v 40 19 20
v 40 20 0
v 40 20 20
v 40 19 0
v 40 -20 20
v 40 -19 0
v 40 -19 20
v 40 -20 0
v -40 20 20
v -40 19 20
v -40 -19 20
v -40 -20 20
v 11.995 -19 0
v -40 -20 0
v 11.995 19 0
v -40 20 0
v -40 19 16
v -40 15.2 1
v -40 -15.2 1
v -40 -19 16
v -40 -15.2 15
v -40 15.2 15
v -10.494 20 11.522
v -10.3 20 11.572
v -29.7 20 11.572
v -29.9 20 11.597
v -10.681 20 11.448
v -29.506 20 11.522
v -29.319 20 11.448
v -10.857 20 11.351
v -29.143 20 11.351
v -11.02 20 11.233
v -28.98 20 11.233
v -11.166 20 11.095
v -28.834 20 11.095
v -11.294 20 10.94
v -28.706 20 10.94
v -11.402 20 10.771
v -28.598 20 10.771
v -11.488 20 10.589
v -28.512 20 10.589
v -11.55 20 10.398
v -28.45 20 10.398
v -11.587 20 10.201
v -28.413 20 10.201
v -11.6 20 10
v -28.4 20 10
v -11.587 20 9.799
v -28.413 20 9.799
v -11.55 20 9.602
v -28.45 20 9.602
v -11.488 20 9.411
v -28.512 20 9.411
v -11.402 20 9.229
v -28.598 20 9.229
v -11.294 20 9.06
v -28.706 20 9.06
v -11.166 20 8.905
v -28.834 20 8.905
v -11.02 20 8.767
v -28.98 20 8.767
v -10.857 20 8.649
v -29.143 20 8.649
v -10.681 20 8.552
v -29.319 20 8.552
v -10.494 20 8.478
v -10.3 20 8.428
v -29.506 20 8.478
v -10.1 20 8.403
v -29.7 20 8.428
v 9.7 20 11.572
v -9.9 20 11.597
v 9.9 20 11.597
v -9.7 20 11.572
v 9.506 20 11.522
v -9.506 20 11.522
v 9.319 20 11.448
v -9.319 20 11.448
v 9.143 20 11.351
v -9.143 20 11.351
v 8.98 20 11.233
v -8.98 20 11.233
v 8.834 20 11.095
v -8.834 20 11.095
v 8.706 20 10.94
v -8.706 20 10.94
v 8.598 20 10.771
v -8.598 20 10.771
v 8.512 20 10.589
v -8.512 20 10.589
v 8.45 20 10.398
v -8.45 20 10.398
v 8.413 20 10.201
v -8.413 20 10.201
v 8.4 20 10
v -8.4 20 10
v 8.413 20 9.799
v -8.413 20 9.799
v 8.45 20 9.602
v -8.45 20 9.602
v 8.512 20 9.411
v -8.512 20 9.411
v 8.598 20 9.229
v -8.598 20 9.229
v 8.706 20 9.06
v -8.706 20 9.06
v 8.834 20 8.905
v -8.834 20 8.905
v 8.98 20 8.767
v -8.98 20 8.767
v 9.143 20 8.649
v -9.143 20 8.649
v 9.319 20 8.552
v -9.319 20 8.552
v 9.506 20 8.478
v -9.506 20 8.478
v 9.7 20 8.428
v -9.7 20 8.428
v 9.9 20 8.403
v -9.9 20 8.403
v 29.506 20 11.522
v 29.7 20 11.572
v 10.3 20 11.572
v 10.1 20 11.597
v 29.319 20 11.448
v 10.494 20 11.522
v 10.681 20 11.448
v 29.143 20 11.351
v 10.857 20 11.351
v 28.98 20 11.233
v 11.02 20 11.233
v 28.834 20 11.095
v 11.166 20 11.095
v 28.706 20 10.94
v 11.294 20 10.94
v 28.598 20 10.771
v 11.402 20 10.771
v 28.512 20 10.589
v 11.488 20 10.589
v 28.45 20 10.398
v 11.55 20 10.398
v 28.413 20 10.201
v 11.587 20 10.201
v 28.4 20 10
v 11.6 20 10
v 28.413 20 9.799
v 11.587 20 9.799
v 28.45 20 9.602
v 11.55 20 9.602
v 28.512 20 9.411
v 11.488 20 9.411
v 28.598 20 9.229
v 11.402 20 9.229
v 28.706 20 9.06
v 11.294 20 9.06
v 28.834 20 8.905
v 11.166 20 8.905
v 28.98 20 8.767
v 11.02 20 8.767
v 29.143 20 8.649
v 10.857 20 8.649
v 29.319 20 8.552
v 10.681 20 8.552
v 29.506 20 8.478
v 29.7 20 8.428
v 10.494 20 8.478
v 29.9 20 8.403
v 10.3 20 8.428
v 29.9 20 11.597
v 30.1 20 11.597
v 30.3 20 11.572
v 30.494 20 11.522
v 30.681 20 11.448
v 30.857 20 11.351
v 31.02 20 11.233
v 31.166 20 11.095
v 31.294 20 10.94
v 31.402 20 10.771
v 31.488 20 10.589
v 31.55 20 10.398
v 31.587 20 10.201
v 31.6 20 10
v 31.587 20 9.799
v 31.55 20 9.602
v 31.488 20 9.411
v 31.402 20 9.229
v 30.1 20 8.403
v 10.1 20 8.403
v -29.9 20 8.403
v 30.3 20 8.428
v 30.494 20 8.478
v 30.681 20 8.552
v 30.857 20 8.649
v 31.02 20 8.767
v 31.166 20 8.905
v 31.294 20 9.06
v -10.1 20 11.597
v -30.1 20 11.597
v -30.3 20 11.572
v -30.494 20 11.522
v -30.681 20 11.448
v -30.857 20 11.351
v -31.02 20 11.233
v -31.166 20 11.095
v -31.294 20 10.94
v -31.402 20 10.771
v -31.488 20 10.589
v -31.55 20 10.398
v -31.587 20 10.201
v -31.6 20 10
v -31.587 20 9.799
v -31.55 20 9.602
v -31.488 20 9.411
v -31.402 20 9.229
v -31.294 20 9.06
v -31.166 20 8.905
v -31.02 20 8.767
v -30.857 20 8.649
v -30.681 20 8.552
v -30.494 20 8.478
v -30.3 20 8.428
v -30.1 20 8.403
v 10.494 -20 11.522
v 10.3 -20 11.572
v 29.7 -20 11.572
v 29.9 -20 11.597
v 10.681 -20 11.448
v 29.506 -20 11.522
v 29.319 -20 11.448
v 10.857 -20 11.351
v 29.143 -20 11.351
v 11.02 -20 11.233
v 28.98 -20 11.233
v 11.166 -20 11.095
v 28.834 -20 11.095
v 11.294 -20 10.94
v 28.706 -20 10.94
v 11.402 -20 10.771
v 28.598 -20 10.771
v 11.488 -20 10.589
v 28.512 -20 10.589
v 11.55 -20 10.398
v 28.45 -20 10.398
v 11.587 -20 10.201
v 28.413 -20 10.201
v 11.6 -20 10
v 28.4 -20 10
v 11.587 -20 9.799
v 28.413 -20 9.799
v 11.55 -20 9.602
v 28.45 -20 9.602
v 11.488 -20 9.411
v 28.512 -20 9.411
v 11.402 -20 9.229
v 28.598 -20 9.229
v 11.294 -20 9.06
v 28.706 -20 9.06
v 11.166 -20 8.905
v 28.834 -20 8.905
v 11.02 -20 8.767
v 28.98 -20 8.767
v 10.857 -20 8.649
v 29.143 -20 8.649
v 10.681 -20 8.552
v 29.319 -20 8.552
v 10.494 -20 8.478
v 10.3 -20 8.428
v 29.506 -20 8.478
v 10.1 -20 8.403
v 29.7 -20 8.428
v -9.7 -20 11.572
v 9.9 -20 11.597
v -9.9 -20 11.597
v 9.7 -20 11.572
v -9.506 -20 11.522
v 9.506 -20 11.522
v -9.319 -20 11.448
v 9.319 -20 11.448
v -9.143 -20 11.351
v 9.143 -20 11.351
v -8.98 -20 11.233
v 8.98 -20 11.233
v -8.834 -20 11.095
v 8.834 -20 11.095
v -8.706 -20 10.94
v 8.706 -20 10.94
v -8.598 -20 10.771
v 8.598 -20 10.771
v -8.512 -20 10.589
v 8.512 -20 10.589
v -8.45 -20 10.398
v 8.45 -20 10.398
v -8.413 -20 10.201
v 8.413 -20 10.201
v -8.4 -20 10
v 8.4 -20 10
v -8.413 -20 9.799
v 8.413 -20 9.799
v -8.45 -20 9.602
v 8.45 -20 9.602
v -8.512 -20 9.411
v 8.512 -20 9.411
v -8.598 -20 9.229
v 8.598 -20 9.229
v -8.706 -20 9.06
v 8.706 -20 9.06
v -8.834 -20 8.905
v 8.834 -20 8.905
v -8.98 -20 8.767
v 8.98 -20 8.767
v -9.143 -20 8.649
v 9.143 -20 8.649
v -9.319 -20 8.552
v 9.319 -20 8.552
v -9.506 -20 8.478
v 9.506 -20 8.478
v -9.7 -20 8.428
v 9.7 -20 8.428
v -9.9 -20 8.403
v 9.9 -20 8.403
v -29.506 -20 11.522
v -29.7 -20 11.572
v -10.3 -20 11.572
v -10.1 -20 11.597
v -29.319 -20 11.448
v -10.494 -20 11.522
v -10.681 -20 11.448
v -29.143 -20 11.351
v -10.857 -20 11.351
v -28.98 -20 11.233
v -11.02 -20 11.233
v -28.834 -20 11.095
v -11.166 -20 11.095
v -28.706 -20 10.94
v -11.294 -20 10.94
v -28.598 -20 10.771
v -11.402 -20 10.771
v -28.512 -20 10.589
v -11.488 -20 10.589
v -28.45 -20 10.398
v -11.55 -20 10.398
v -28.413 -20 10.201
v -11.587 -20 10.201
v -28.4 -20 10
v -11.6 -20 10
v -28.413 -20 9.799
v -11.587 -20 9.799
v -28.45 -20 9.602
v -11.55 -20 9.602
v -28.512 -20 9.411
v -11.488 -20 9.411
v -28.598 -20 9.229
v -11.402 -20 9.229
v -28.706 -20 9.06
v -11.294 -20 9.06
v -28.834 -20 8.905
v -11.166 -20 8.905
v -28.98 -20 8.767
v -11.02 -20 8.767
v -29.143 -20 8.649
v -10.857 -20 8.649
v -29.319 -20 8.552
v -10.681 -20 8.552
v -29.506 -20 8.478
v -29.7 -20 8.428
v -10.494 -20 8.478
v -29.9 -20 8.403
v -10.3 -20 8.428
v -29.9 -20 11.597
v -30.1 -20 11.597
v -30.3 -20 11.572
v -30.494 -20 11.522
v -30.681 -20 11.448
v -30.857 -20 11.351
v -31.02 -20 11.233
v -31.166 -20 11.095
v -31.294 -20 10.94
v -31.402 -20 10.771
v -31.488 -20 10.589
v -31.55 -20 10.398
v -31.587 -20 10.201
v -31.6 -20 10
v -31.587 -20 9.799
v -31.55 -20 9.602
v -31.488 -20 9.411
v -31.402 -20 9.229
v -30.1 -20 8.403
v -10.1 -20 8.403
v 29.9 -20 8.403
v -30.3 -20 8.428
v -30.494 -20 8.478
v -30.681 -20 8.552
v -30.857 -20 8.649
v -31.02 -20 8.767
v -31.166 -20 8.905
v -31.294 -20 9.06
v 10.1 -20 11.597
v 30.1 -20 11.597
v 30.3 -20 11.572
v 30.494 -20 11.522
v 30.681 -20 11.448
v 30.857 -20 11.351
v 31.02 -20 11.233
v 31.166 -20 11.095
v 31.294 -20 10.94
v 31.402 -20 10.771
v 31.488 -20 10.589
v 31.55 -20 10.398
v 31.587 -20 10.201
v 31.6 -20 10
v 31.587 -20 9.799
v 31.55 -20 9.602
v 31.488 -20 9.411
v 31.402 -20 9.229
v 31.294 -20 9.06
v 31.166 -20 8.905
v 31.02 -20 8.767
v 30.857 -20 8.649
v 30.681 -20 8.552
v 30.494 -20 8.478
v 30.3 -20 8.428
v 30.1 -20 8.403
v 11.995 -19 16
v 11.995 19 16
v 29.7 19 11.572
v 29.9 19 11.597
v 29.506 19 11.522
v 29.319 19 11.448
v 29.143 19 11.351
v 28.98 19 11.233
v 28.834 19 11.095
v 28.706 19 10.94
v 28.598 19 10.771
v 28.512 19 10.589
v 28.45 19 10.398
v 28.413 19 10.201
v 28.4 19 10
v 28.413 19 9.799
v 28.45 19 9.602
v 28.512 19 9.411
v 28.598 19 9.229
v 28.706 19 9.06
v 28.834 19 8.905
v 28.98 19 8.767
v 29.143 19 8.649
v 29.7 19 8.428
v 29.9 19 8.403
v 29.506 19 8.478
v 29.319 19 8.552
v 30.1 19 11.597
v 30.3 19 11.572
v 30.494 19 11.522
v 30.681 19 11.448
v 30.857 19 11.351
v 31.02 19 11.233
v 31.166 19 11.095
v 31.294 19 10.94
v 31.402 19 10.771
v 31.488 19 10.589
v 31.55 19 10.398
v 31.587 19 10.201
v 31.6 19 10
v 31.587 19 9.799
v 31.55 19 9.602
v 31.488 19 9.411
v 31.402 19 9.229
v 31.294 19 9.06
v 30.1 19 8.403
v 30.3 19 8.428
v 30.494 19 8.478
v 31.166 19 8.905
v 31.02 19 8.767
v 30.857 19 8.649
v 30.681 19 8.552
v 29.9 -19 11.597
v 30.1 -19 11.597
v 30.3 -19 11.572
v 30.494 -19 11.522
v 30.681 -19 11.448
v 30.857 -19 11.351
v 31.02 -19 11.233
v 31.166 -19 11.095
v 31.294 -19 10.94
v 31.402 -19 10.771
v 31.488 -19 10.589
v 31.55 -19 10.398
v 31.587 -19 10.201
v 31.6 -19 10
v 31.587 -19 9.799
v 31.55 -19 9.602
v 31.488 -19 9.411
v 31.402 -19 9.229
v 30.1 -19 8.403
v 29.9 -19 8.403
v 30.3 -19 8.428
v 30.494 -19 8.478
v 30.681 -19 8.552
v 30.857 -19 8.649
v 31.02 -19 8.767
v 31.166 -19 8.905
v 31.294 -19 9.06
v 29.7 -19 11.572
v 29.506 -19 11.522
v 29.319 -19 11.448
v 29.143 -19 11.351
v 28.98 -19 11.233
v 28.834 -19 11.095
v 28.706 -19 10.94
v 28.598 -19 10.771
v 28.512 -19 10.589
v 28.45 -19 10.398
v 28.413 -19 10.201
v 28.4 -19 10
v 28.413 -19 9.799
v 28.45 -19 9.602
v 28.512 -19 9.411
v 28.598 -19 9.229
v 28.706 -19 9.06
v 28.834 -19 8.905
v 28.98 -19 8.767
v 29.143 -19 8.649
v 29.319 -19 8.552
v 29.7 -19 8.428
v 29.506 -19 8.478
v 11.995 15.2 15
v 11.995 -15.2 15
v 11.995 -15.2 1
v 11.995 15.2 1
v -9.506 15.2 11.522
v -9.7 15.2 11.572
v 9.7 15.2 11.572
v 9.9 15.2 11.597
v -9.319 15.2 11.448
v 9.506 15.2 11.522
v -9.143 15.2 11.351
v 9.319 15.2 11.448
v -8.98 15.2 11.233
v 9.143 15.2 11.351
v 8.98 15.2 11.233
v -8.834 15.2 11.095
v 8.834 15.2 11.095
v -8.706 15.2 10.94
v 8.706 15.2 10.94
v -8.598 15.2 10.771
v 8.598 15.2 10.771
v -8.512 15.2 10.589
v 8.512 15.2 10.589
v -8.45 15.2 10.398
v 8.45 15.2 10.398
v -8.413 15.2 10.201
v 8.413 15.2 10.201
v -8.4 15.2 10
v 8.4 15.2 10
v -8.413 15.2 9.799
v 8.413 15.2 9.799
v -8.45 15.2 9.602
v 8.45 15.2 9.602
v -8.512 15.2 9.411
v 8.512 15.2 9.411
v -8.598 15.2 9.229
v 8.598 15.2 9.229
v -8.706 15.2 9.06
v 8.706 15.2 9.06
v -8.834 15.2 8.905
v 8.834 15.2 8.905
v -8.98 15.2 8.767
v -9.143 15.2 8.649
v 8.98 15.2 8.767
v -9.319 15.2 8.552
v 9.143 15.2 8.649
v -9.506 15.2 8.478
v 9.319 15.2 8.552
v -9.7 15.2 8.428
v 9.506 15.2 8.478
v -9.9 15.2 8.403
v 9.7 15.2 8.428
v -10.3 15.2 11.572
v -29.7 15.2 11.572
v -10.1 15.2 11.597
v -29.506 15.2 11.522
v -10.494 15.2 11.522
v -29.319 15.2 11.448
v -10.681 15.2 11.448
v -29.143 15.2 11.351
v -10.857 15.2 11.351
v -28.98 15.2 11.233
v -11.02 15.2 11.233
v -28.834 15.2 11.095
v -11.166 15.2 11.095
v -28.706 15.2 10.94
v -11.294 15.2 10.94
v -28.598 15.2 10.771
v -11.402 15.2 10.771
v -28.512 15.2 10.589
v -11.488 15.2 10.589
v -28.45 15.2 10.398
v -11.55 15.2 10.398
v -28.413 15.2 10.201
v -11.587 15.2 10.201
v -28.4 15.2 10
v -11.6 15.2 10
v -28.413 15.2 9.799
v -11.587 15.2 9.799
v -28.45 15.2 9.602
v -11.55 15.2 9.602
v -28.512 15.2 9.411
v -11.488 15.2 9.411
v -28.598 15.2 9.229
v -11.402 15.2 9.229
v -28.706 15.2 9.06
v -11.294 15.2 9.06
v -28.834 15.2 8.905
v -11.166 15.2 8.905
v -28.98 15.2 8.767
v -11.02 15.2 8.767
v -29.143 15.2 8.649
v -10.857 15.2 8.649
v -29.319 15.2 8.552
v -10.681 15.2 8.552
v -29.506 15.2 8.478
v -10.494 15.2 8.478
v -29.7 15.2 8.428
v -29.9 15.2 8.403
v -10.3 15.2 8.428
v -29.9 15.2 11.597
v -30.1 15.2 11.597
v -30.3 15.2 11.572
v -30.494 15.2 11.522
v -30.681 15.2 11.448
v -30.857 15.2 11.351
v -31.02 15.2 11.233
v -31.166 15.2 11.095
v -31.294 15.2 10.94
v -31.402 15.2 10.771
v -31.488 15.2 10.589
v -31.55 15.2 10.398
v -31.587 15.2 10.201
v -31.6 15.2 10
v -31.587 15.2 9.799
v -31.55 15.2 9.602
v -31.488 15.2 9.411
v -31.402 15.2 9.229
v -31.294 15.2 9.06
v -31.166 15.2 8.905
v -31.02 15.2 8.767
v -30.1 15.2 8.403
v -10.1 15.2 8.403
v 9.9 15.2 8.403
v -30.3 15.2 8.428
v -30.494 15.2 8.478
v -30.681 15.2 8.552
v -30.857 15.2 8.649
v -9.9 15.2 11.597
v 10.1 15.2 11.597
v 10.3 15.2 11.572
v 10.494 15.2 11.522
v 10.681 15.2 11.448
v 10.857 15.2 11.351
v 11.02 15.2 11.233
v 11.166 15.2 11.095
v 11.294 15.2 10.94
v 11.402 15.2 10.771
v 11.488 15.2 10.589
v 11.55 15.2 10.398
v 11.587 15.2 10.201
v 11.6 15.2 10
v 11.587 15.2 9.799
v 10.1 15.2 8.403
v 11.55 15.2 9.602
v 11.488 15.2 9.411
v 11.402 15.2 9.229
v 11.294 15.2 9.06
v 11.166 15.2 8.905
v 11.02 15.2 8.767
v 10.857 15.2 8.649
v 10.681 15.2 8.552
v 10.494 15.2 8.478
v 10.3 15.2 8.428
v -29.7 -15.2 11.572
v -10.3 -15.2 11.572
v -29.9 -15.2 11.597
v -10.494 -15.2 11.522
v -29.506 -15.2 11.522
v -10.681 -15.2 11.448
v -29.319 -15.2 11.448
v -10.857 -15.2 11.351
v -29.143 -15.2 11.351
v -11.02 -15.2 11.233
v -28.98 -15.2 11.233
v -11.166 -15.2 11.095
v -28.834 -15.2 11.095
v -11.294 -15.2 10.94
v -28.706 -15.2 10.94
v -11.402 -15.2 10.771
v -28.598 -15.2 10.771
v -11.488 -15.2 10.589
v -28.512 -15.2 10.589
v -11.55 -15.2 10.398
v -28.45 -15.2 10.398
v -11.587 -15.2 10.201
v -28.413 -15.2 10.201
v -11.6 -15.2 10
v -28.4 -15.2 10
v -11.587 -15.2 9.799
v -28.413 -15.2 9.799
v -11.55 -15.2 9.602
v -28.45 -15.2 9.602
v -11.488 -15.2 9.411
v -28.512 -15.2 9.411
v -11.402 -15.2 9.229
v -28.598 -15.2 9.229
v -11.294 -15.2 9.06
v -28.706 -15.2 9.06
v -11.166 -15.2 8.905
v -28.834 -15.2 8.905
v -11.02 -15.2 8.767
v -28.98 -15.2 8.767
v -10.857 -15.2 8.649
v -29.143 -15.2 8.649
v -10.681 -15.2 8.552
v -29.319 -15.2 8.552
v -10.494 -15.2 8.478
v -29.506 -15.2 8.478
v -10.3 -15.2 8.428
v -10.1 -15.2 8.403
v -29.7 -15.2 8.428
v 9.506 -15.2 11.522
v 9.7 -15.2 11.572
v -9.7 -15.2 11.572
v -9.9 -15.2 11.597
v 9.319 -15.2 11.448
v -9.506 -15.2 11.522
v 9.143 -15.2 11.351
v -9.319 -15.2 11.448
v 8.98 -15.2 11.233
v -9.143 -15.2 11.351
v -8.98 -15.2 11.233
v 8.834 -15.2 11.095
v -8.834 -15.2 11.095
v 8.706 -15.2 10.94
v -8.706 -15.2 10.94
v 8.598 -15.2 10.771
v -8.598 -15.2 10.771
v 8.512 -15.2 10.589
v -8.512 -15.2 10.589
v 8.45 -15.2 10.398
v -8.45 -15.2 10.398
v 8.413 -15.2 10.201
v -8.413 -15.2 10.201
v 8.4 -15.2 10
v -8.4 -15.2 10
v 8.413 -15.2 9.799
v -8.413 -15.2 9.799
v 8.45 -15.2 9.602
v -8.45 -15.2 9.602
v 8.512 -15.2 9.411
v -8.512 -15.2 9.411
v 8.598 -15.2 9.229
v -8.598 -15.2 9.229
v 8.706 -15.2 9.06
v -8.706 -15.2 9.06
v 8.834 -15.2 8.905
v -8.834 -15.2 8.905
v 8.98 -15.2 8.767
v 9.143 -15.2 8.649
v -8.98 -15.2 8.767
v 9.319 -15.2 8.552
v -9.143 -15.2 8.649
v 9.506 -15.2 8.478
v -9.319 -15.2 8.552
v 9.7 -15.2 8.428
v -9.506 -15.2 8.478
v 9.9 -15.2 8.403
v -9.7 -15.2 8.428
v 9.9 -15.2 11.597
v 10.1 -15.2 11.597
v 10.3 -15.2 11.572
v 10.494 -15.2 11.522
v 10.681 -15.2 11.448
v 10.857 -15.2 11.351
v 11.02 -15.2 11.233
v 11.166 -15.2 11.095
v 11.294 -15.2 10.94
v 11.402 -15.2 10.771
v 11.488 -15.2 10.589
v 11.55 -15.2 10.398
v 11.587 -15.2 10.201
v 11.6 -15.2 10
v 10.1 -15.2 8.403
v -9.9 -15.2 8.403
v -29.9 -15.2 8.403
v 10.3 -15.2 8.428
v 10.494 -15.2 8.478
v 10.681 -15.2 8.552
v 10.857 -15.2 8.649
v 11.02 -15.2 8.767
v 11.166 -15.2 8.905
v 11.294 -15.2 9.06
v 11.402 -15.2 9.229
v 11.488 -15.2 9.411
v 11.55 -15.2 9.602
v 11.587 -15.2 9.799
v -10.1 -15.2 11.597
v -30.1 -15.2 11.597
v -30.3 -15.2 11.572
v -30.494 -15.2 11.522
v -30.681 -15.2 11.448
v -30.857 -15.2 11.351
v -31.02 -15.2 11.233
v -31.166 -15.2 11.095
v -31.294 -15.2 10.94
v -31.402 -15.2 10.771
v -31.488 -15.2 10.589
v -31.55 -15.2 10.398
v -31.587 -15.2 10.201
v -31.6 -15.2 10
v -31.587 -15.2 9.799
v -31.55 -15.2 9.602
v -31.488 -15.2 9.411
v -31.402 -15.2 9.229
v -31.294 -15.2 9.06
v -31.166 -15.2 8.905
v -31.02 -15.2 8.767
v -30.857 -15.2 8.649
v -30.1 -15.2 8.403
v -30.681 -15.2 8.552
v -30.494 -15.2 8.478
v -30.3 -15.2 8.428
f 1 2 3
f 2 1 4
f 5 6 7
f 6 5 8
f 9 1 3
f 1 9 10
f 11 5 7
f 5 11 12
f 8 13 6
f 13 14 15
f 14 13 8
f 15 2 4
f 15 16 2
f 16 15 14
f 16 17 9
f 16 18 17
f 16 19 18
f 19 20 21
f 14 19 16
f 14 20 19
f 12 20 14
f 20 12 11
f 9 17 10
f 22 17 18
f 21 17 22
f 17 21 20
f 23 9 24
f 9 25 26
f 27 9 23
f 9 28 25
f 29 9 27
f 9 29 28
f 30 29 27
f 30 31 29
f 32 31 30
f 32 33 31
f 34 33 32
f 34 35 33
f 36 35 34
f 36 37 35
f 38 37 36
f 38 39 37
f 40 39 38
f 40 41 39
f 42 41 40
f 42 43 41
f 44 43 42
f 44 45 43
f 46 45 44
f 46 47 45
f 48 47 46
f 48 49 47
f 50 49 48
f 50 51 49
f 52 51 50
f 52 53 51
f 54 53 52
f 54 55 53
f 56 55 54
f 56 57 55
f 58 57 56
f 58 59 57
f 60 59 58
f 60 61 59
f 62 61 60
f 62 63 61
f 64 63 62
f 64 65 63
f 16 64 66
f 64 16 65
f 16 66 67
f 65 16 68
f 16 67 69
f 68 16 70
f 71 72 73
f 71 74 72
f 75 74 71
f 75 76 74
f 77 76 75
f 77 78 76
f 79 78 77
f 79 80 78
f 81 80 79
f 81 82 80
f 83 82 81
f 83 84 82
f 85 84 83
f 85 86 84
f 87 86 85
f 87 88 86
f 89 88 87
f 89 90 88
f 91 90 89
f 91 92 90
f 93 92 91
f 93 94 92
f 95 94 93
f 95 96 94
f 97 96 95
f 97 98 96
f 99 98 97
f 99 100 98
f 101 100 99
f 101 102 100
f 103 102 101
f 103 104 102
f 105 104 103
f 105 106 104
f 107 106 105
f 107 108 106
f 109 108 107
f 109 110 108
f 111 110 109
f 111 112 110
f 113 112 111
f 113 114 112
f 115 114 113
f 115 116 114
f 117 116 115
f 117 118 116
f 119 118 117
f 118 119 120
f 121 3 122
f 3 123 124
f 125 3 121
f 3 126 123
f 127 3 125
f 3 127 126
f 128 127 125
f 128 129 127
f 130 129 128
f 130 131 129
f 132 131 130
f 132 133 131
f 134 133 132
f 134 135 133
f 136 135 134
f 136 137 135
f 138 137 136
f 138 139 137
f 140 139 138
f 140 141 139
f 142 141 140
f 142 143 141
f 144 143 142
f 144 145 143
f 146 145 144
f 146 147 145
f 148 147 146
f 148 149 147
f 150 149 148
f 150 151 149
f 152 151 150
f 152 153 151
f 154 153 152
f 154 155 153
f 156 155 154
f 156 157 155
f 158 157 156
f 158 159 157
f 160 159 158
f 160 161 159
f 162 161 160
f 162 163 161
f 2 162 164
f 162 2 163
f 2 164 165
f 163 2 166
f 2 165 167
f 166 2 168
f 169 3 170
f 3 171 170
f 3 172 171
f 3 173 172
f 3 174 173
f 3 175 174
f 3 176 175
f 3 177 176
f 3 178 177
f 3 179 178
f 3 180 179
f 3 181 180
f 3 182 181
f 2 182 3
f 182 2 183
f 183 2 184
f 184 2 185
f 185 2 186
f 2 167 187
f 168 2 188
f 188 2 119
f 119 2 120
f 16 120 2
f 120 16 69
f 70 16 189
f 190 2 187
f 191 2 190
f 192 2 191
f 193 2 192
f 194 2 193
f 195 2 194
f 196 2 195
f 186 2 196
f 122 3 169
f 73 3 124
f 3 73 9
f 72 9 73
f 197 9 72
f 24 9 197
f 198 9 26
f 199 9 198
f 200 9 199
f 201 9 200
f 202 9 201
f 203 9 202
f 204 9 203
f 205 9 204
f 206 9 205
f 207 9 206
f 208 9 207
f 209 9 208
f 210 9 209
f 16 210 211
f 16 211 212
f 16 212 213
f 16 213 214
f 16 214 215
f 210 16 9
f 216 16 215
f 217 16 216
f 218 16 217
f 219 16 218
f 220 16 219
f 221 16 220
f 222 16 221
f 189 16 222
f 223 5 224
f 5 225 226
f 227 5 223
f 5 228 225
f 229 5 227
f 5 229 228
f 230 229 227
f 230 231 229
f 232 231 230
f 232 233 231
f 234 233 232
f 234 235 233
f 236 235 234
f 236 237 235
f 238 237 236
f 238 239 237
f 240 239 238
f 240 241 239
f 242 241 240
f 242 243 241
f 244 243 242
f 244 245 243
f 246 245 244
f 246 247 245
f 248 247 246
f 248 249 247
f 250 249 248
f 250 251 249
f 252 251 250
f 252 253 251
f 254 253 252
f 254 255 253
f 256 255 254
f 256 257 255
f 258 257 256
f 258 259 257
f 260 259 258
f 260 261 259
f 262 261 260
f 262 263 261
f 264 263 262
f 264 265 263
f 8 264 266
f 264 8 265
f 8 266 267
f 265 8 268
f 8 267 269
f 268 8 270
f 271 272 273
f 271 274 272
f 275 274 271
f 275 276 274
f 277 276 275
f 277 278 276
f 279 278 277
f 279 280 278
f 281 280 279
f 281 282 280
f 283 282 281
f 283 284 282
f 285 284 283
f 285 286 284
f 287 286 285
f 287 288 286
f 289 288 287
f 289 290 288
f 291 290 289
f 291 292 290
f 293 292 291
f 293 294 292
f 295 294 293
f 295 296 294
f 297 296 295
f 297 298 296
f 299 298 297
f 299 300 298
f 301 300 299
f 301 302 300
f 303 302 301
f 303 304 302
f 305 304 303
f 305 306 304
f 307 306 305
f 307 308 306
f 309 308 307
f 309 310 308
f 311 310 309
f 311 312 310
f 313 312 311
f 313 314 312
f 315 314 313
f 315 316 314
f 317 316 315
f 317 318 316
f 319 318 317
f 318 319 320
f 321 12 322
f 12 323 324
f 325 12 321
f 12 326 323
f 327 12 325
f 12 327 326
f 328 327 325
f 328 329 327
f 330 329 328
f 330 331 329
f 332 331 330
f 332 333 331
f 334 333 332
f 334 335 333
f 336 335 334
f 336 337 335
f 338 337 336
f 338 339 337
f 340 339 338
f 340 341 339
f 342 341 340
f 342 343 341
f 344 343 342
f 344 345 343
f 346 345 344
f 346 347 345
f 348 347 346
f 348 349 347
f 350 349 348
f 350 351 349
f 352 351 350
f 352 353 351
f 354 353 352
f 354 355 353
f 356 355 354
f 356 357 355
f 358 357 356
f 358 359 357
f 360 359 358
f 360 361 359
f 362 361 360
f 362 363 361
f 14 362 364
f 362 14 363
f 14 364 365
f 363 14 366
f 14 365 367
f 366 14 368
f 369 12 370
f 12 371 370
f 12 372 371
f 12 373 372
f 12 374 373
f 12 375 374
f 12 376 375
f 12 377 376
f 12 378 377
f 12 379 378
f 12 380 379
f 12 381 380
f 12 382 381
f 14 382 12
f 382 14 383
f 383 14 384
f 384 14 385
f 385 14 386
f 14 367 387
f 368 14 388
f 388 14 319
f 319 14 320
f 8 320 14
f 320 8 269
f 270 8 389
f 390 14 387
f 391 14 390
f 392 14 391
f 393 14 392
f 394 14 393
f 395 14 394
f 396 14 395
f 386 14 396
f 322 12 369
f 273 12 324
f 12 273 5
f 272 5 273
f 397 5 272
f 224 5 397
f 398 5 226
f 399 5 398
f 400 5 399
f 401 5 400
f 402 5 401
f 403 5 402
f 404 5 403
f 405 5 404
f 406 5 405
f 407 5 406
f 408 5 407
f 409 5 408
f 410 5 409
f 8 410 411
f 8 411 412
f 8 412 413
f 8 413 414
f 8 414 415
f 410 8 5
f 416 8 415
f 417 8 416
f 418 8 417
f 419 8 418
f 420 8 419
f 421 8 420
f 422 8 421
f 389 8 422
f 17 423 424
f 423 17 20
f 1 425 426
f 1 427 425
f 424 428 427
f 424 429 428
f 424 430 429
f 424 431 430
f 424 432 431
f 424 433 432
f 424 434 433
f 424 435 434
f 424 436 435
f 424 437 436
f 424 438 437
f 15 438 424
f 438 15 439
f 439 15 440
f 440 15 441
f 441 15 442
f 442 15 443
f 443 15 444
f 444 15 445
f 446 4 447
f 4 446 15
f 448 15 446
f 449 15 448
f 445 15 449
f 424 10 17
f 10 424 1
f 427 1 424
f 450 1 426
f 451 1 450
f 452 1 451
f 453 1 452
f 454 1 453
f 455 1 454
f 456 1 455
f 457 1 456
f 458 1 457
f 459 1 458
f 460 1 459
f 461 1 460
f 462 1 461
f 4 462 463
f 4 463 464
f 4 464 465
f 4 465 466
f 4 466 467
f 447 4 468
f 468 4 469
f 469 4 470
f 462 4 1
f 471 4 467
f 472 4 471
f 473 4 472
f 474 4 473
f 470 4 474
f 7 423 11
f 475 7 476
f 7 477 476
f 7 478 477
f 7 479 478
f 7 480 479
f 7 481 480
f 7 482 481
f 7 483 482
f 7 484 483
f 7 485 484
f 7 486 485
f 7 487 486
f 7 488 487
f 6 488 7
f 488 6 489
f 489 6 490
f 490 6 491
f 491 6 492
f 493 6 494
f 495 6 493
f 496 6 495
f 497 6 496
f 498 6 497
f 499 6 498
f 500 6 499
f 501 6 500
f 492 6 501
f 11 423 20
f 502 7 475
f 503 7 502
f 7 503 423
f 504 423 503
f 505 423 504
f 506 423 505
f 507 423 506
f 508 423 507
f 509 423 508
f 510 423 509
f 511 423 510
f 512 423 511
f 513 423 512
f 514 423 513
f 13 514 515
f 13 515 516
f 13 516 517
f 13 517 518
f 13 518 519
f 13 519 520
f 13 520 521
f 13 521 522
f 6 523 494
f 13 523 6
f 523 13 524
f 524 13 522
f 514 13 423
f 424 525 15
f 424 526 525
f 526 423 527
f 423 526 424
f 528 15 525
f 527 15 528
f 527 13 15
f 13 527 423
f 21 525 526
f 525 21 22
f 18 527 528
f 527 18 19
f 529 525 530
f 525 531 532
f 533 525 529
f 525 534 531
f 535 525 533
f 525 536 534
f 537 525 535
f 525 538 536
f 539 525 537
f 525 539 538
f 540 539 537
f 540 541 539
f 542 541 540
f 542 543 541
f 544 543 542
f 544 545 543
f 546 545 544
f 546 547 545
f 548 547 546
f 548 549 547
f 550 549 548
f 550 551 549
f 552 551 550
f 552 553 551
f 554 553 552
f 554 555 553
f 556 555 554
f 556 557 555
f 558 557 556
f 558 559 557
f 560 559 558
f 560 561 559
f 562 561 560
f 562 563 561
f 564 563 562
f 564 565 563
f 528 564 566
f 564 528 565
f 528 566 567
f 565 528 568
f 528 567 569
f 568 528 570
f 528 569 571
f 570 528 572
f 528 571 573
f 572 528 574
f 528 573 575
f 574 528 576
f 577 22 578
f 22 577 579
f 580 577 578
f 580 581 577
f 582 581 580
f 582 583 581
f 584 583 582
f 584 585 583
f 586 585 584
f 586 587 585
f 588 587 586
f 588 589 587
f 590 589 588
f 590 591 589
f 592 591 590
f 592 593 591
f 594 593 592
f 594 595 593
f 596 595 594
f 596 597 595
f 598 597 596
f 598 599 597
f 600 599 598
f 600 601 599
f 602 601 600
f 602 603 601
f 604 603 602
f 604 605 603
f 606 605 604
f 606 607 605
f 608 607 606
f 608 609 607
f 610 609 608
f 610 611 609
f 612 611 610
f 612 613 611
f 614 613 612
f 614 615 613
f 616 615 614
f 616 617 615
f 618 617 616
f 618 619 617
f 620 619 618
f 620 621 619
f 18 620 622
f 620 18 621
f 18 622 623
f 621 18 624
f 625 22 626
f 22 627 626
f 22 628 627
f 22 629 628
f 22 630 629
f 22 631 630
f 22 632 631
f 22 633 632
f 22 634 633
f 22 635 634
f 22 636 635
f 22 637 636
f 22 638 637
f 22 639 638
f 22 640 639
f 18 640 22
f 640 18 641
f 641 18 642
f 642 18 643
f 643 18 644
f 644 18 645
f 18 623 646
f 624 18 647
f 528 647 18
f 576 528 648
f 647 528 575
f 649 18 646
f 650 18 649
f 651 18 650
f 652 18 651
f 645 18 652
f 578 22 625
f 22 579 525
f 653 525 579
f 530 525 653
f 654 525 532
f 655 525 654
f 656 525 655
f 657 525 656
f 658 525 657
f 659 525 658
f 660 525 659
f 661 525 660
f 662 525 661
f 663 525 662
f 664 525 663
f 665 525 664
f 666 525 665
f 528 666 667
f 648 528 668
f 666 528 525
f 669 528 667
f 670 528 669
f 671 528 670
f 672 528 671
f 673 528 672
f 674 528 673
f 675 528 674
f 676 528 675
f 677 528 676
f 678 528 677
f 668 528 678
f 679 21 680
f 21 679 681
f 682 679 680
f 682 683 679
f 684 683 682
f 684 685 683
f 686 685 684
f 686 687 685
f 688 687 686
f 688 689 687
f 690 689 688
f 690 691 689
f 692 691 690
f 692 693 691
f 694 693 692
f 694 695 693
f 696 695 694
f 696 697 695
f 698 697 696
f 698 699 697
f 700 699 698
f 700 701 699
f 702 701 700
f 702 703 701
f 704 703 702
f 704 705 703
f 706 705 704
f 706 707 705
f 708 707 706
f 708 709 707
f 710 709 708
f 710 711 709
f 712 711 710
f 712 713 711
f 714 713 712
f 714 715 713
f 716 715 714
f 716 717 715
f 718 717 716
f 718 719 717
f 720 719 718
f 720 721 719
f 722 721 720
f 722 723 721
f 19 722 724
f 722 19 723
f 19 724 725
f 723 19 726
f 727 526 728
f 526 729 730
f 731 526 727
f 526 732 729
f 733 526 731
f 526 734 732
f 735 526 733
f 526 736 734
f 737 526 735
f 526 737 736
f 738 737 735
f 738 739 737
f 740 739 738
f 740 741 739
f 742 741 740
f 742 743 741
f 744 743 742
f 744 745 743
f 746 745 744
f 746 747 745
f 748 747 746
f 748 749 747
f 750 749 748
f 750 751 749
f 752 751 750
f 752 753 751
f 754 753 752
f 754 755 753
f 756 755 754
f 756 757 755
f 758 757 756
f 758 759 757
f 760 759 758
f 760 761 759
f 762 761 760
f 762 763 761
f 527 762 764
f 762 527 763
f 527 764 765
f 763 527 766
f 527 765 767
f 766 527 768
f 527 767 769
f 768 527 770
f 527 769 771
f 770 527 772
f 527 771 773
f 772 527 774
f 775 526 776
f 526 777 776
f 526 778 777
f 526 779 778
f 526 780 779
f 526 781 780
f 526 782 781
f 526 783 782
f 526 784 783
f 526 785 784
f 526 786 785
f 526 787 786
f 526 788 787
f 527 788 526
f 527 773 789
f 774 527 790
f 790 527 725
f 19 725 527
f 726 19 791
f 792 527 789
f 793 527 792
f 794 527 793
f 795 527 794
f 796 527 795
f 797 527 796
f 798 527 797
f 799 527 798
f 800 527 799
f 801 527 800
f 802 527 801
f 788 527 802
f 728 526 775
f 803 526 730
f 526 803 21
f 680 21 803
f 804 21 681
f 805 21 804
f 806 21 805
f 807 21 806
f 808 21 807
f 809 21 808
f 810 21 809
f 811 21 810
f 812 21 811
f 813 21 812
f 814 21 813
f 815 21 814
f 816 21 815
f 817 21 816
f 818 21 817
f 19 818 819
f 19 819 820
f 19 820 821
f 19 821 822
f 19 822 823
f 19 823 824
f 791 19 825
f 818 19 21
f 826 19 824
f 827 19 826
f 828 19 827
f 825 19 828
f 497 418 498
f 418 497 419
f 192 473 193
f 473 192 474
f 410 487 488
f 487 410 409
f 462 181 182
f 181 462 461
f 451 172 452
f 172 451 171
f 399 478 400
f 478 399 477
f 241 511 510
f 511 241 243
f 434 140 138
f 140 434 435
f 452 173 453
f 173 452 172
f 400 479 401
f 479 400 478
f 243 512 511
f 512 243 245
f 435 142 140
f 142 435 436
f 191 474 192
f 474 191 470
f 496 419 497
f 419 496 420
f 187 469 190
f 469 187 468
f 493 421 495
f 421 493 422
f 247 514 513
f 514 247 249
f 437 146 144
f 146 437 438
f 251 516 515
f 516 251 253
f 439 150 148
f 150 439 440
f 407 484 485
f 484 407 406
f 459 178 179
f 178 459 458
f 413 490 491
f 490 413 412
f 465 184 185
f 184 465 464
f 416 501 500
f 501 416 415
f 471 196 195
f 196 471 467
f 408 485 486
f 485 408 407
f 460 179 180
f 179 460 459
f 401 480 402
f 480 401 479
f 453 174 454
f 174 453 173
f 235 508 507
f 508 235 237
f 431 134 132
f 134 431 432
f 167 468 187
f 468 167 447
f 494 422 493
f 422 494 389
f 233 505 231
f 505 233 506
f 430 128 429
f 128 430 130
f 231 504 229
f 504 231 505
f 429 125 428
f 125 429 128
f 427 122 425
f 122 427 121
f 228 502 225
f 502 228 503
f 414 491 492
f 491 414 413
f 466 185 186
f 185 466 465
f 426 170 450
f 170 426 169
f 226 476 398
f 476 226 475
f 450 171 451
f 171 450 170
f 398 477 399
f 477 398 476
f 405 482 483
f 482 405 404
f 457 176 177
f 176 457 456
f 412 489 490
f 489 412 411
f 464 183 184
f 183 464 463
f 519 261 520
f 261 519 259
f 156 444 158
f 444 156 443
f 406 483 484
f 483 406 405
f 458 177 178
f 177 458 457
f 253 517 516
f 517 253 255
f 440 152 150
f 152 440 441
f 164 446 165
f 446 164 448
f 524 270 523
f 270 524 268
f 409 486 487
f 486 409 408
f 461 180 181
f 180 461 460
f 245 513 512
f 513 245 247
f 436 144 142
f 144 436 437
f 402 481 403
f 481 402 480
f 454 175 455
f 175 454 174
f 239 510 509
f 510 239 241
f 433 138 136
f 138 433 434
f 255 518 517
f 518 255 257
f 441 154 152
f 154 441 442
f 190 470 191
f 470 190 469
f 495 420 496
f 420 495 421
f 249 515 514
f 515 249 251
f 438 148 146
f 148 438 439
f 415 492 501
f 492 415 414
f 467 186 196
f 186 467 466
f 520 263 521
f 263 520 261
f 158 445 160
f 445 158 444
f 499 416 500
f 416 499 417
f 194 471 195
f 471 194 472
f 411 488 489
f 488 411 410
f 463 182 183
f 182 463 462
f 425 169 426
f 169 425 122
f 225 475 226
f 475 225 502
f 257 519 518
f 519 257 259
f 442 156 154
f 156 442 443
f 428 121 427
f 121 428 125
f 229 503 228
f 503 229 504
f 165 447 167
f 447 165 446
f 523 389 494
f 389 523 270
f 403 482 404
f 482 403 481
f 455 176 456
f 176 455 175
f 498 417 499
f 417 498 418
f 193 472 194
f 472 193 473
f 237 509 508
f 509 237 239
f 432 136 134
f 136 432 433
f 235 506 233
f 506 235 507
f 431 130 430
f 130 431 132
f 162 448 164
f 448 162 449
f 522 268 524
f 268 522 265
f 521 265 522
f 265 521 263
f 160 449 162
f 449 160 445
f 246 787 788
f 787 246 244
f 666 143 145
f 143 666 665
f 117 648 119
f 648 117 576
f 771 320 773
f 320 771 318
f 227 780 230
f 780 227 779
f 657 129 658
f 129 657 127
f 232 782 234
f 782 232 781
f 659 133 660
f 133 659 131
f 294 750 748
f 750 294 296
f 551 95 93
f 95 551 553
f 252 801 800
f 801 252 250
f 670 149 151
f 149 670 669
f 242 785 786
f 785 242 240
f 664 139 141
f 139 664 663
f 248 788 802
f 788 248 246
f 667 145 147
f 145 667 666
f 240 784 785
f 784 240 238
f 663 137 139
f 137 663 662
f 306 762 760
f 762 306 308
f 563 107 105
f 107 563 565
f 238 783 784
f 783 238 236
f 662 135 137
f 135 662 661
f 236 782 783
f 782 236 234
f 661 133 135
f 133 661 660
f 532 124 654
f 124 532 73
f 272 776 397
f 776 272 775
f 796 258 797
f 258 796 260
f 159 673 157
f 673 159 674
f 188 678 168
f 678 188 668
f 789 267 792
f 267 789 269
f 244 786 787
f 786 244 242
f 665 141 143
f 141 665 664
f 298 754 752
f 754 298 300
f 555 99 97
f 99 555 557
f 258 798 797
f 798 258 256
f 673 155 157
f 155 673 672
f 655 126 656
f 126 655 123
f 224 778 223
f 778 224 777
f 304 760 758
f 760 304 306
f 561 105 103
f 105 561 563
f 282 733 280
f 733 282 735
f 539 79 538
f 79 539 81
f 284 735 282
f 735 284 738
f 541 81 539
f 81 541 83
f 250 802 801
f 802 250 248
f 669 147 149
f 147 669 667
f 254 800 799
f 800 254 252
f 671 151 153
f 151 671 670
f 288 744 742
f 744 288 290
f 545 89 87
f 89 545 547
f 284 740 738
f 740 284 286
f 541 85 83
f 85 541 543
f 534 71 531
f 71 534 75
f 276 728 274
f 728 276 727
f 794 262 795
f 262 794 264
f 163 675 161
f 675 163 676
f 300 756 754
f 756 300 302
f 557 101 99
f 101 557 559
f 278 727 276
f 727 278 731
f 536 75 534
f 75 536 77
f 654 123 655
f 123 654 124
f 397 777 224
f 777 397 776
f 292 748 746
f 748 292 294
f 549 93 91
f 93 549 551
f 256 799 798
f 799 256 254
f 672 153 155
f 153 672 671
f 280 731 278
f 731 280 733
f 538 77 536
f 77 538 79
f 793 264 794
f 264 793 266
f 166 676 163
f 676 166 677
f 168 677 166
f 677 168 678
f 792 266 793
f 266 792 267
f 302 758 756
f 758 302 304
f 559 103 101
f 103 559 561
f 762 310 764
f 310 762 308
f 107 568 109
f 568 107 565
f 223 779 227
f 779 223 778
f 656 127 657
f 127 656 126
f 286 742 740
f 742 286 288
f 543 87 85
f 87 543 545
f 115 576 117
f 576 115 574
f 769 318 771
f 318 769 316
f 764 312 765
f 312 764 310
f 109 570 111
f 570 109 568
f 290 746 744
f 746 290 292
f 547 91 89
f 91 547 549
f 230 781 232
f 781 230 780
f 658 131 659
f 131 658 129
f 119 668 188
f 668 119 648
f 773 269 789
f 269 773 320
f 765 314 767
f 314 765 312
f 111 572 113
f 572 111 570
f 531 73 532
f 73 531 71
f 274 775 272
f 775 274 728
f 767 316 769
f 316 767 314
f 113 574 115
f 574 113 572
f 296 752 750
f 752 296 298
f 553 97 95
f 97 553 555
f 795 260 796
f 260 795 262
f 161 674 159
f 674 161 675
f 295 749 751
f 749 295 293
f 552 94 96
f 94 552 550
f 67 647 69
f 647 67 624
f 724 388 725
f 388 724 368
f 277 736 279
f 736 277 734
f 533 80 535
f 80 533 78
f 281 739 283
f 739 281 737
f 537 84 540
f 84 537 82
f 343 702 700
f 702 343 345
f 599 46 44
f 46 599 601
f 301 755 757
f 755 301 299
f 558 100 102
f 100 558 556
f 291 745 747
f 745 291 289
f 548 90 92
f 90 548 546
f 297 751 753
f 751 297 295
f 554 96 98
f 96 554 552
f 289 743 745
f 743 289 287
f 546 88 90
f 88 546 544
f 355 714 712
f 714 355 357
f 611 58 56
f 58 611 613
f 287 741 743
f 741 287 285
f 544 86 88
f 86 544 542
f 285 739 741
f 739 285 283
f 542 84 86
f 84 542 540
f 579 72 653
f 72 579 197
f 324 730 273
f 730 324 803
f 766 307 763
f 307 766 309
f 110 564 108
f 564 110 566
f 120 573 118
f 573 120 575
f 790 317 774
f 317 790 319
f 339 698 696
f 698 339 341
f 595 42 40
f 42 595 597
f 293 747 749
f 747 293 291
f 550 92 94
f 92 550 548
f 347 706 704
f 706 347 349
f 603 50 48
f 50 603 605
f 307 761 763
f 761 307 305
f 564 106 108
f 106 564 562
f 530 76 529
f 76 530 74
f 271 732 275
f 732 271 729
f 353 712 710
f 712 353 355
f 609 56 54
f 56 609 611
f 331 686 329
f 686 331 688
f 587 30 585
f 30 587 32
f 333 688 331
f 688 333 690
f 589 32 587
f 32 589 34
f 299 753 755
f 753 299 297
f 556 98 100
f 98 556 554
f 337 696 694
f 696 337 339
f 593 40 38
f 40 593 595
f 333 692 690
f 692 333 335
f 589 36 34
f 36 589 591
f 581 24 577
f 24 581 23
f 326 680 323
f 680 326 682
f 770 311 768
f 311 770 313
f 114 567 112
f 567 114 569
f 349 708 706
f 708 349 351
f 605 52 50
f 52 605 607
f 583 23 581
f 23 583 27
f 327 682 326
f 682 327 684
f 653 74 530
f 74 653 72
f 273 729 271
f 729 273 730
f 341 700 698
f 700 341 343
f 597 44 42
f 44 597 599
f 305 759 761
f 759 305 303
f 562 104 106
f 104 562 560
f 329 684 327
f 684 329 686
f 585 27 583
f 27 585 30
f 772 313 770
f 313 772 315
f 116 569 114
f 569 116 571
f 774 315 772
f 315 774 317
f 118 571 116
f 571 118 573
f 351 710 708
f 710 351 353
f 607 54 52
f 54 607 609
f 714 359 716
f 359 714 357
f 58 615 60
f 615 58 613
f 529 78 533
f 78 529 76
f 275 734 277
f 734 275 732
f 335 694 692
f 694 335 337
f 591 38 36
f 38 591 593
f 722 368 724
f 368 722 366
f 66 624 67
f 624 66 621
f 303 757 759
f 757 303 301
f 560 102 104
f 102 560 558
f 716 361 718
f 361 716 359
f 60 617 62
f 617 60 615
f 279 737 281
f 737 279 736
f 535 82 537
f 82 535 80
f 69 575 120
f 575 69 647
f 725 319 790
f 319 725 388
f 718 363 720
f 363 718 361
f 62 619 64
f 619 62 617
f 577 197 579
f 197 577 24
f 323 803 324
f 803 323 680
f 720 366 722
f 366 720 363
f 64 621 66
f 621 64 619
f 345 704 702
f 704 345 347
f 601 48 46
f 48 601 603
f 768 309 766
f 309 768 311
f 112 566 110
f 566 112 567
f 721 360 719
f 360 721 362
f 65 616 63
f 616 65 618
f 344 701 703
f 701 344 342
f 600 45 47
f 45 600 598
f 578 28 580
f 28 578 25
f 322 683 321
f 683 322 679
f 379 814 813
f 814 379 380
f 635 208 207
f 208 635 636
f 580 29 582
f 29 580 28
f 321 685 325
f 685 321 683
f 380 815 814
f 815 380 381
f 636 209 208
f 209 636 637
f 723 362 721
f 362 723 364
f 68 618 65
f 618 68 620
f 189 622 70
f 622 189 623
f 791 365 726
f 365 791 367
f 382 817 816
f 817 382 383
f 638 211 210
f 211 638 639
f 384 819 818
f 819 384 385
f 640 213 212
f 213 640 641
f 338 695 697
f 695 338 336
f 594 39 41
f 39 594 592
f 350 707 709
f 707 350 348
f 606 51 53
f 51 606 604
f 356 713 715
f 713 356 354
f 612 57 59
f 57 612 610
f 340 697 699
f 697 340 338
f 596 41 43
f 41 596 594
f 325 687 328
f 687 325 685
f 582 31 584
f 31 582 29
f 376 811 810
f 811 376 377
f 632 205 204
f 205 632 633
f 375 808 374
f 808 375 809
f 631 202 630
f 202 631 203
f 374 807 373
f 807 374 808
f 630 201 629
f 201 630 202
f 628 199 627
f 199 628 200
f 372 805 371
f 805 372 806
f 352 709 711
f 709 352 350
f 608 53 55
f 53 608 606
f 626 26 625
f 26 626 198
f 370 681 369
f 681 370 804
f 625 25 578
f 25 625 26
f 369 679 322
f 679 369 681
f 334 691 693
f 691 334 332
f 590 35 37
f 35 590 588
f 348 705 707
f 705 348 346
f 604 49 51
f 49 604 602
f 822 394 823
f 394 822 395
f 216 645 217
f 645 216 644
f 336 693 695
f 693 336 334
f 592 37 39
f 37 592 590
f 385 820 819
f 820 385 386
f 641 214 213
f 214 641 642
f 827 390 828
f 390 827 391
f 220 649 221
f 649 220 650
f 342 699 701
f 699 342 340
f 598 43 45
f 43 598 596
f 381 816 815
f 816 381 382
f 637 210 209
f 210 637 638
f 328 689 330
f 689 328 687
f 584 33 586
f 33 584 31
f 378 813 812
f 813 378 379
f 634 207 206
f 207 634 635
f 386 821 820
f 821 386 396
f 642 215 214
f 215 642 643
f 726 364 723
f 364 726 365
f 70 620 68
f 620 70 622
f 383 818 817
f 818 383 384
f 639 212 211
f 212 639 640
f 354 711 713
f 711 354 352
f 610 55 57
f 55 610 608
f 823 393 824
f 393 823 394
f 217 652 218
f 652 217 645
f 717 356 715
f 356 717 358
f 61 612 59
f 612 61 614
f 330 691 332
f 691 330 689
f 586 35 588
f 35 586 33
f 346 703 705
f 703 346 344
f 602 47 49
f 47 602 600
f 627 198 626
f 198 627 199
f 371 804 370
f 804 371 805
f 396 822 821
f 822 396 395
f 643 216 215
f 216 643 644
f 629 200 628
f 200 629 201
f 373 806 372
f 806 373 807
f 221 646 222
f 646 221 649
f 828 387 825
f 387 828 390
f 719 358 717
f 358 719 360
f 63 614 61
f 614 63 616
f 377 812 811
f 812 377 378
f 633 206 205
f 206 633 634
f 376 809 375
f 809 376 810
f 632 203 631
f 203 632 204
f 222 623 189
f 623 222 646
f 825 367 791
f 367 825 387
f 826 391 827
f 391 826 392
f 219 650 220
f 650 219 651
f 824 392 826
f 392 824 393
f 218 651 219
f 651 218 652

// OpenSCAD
module claw(){
    shaft_to_left = 6;
    shaft_to_edge = 23;
    difference(){
    union(){
    //top
    translate([14/2, 0, 31+3/2])cube([8+14, 9, 3],center=true);
    //main
    translate([-shaft_to_left+(shaft_to_left+shaft_to_edge+2)/2, 0, -2+(2+2+27+2)/2])cube([shaft_to_left+shaft_to_edge+2, 10, 2+2+27+2],center=true);
    }
    //-top
    hull(){
    translate([0, 0, 34-2/2])cylinder(r=3, h=2.01, center=true, $fn=50);
    translate([14.5, 0, 34-2/2])cylinder(r=2, h=2.01, center=true, $fn=50);
    }
    //center
    translate([-shaft_to_left+(shaft_to_left+shaft_to_edge)/2,0,0])translate([0, 0, (2+27)/2])cube([shaft_to_left+shaft_to_edge, 99, 2+27],center=true);
    //hole top
    translate([0, 0, 31])cylinder(r=3.5+0.1, h=10, center=true, $fn=50);
    }
    //hole bot
    translate([0, 0, 2/2])cylinder(r=3.5-0.1, h=2, center=true, $fn=50);
}


module nearmotor(){
    armlen = 31.8;
    holedist = 27.7;
    bodylen = 22.4;
    bodythick = 12.5;
    bodyheight = 16.1;

    difference(){
    translate([0,0,(bodyheight+2)/2])cube([armlen, bodythick, bodyheight+2],center=true);
    //-body
    translate([0,0,2+bodyheight/2])cube([bodylen+0.4, 99, bodyheight],center=true);
    //-cable
    translate([ 25/2-4/2, 0, 2+99/2])cube([4, 4, 99],center=true);
    translate([-25/2+4/2, 0, 2+99/2])cube([4, 4, 99],center=true);
    translate([0, 0, 2+8/2])cube([400, 4, 8],center=true);
    //-hole to frame
    translate([-holedist/2, 0, 0])cylinder(r=1, h=99, center=true, $fn=50);
    translate([ holedist/2, 0, 0])cylinder(r=1, h=99, center=true, $fn=50);
    //-hole to shaft
    translate([ bodylen/2-6, 0, -2/2])cylinder(r=3.5+0.1, h=99, center=true, $fn=50);
    translate([-bodylen/2+6, 0, -2/2])cylinder(r=3.5+0.1, h=99, center=true, $fn=50);
    }
    //+shaft

}


module body(){
    difference(){
        union(){
        translate([ 20+2/2, 0, 40/2])cube([2, 40, 40],center=true);
        translate([-20-2/2, 0, 40/2])cube([2, 40, 40],center=true);
        translate([ 20+2/2, 0, 20/2])cube([2, 80, 20],center=true);
        translate([-20-2/2, 0, 20/2])cube([2, 80, 20],center=true);
        }
        translate([0, 10, 30])rotate([0,90,0])cylinder(r=1.6, h=99, center=true, $fn=50);
        translate([0,-10, 30])rotate([0,90,0])cylinder(r=1.6, h=99, center=true, $fn=50);
        //
        translate([0, 30, 10])rotate([0,90,0])cylinder(r=1.6, h=99, center=true, $fn=50);
        translate([0, 10, 10])rotate([0,90,0])cylinder(r=1.6, h=99, center=true, $fn=50);
        translate([0,-10, 10])rotate([0,90,0])cylinder(r=1.6, h=99, center=true, $fn=50);
        translate([0,-30, 10])rotate([0,90,0])cylinder(r=1.6, h=99, center=true, $fn=50);
    }
    //
    difference(){
        union(){
        translate([0, 0, 2/2])cylinder(r=60, h=2, center=true, $fn=100);
        }
        //batt
        translate([ 10, 40-20/2, 0])cube([16, 20, 20],center=true);
        translate([-10, 40-20/2, 0])cube([16, 20, 20],center=true);
        translate([ 10,       0, 1+1/2])cube([12, 40, 1.01],center=true);
        translate([-10,       0, 1+1/2])cube([12, 40, 1.01],center=true);
        translate([ 10,-40+20/2, 0])cube([16, 20, 20],center=true);
        translate([-10,-40+20/2, 0])cube([16, 20, 20],center=true);
        //outer hole for leg
        for(i=[0:60:350]){
            rotate([0,0,i])translate([60,0, 0])cylinder(r=5, h=99, center=true, $fn=50);
        }
        //outer hole between leg
        for(i=[30:60:350]){
            rotate([0,0,i])translate([60,0, 0])cylinder(r=8.5, h=99, center=true, $fn=50);
        }
        //screw hole
        for(i=[-30:30:59]){
        rotate([0,0,i])translate([40,0,0])cylinder(r=1.6, h=99, center=true, $fn=50);
        rotate([0,0,i])translate([-40,0,0])cylinder(r=1.6, h=99, center=true, $fn=50);
        }
    }
}


type=10;
if(type==0){    //body
    //translate([60, 0, 0])rotate([0, 0, 100])claw();
    bodylen = 22.4;
    for(i=[0:60:350]){
        rotate([0,0,i])translate([-60,0,0])rotate([0, 0, 0])translate([-bodylen/2+6,0,0])nearmotor();
    }
    body();
}
else if(type==1){   //motor1.shaft to motor 2
    translate([31.25, -13.1, 29/2])rotate([0, 90, 90])nearmotor();
    mirror([0,1,0])claw();
}
else if(type==2){       //motor2.shaft to finger
    claw();
    difference(){
        hull(){
            translate([25, 0, 14.5])cube([0.1, 10, 33], center=true);
            translate([50, 0, 15])sphere(r=5, $fn=50);
        }
        hull(){
            translate([25, 0, 14.5])cube([0.1, 99, 33-4], center=true);
            translate([50, 0, 15])cube([0.1, 99, 6], center=true);
        }
    }
}
else if(type==10){      //bulk box
    difference(){
    translate([0, 0, 20/2])cube([80, 40, 20], center=true);
    //upper
    translate([0, 0, 20-4/2])cube([99, 38, 4], center=true);
    //bot.xxxxx
    translate([40-28/2, 0, 10])cube([28.01, 38, 20], center=true);
    //bot.bulk
    translate([-80/2+52/2, 0, 1+(14)/2])cube([52.01, 30+0.4, 14], center=true);
    //hole
    translate([ 30, 0, 10])rotate([90,0,0])cylinder(r=1.6, h=99, center=true, $fn=50);
    translate([ 10, 0, 10])rotate([90,0,0])cylinder(r=1.6, h=99, center=true, $fn=50);
    translate([-10, 0, 10])rotate([90,0,0])cylinder(r=1.6, h=99, center=true, $fn=50);
    translate([-30, 0, 10])rotate([90,0,0])cylinder(r=1.6, h=99, center=true, $fn=50);
    }
}
else if(type==99){
    nearmotor();
    translate([0, 20, 0])claw();
}
